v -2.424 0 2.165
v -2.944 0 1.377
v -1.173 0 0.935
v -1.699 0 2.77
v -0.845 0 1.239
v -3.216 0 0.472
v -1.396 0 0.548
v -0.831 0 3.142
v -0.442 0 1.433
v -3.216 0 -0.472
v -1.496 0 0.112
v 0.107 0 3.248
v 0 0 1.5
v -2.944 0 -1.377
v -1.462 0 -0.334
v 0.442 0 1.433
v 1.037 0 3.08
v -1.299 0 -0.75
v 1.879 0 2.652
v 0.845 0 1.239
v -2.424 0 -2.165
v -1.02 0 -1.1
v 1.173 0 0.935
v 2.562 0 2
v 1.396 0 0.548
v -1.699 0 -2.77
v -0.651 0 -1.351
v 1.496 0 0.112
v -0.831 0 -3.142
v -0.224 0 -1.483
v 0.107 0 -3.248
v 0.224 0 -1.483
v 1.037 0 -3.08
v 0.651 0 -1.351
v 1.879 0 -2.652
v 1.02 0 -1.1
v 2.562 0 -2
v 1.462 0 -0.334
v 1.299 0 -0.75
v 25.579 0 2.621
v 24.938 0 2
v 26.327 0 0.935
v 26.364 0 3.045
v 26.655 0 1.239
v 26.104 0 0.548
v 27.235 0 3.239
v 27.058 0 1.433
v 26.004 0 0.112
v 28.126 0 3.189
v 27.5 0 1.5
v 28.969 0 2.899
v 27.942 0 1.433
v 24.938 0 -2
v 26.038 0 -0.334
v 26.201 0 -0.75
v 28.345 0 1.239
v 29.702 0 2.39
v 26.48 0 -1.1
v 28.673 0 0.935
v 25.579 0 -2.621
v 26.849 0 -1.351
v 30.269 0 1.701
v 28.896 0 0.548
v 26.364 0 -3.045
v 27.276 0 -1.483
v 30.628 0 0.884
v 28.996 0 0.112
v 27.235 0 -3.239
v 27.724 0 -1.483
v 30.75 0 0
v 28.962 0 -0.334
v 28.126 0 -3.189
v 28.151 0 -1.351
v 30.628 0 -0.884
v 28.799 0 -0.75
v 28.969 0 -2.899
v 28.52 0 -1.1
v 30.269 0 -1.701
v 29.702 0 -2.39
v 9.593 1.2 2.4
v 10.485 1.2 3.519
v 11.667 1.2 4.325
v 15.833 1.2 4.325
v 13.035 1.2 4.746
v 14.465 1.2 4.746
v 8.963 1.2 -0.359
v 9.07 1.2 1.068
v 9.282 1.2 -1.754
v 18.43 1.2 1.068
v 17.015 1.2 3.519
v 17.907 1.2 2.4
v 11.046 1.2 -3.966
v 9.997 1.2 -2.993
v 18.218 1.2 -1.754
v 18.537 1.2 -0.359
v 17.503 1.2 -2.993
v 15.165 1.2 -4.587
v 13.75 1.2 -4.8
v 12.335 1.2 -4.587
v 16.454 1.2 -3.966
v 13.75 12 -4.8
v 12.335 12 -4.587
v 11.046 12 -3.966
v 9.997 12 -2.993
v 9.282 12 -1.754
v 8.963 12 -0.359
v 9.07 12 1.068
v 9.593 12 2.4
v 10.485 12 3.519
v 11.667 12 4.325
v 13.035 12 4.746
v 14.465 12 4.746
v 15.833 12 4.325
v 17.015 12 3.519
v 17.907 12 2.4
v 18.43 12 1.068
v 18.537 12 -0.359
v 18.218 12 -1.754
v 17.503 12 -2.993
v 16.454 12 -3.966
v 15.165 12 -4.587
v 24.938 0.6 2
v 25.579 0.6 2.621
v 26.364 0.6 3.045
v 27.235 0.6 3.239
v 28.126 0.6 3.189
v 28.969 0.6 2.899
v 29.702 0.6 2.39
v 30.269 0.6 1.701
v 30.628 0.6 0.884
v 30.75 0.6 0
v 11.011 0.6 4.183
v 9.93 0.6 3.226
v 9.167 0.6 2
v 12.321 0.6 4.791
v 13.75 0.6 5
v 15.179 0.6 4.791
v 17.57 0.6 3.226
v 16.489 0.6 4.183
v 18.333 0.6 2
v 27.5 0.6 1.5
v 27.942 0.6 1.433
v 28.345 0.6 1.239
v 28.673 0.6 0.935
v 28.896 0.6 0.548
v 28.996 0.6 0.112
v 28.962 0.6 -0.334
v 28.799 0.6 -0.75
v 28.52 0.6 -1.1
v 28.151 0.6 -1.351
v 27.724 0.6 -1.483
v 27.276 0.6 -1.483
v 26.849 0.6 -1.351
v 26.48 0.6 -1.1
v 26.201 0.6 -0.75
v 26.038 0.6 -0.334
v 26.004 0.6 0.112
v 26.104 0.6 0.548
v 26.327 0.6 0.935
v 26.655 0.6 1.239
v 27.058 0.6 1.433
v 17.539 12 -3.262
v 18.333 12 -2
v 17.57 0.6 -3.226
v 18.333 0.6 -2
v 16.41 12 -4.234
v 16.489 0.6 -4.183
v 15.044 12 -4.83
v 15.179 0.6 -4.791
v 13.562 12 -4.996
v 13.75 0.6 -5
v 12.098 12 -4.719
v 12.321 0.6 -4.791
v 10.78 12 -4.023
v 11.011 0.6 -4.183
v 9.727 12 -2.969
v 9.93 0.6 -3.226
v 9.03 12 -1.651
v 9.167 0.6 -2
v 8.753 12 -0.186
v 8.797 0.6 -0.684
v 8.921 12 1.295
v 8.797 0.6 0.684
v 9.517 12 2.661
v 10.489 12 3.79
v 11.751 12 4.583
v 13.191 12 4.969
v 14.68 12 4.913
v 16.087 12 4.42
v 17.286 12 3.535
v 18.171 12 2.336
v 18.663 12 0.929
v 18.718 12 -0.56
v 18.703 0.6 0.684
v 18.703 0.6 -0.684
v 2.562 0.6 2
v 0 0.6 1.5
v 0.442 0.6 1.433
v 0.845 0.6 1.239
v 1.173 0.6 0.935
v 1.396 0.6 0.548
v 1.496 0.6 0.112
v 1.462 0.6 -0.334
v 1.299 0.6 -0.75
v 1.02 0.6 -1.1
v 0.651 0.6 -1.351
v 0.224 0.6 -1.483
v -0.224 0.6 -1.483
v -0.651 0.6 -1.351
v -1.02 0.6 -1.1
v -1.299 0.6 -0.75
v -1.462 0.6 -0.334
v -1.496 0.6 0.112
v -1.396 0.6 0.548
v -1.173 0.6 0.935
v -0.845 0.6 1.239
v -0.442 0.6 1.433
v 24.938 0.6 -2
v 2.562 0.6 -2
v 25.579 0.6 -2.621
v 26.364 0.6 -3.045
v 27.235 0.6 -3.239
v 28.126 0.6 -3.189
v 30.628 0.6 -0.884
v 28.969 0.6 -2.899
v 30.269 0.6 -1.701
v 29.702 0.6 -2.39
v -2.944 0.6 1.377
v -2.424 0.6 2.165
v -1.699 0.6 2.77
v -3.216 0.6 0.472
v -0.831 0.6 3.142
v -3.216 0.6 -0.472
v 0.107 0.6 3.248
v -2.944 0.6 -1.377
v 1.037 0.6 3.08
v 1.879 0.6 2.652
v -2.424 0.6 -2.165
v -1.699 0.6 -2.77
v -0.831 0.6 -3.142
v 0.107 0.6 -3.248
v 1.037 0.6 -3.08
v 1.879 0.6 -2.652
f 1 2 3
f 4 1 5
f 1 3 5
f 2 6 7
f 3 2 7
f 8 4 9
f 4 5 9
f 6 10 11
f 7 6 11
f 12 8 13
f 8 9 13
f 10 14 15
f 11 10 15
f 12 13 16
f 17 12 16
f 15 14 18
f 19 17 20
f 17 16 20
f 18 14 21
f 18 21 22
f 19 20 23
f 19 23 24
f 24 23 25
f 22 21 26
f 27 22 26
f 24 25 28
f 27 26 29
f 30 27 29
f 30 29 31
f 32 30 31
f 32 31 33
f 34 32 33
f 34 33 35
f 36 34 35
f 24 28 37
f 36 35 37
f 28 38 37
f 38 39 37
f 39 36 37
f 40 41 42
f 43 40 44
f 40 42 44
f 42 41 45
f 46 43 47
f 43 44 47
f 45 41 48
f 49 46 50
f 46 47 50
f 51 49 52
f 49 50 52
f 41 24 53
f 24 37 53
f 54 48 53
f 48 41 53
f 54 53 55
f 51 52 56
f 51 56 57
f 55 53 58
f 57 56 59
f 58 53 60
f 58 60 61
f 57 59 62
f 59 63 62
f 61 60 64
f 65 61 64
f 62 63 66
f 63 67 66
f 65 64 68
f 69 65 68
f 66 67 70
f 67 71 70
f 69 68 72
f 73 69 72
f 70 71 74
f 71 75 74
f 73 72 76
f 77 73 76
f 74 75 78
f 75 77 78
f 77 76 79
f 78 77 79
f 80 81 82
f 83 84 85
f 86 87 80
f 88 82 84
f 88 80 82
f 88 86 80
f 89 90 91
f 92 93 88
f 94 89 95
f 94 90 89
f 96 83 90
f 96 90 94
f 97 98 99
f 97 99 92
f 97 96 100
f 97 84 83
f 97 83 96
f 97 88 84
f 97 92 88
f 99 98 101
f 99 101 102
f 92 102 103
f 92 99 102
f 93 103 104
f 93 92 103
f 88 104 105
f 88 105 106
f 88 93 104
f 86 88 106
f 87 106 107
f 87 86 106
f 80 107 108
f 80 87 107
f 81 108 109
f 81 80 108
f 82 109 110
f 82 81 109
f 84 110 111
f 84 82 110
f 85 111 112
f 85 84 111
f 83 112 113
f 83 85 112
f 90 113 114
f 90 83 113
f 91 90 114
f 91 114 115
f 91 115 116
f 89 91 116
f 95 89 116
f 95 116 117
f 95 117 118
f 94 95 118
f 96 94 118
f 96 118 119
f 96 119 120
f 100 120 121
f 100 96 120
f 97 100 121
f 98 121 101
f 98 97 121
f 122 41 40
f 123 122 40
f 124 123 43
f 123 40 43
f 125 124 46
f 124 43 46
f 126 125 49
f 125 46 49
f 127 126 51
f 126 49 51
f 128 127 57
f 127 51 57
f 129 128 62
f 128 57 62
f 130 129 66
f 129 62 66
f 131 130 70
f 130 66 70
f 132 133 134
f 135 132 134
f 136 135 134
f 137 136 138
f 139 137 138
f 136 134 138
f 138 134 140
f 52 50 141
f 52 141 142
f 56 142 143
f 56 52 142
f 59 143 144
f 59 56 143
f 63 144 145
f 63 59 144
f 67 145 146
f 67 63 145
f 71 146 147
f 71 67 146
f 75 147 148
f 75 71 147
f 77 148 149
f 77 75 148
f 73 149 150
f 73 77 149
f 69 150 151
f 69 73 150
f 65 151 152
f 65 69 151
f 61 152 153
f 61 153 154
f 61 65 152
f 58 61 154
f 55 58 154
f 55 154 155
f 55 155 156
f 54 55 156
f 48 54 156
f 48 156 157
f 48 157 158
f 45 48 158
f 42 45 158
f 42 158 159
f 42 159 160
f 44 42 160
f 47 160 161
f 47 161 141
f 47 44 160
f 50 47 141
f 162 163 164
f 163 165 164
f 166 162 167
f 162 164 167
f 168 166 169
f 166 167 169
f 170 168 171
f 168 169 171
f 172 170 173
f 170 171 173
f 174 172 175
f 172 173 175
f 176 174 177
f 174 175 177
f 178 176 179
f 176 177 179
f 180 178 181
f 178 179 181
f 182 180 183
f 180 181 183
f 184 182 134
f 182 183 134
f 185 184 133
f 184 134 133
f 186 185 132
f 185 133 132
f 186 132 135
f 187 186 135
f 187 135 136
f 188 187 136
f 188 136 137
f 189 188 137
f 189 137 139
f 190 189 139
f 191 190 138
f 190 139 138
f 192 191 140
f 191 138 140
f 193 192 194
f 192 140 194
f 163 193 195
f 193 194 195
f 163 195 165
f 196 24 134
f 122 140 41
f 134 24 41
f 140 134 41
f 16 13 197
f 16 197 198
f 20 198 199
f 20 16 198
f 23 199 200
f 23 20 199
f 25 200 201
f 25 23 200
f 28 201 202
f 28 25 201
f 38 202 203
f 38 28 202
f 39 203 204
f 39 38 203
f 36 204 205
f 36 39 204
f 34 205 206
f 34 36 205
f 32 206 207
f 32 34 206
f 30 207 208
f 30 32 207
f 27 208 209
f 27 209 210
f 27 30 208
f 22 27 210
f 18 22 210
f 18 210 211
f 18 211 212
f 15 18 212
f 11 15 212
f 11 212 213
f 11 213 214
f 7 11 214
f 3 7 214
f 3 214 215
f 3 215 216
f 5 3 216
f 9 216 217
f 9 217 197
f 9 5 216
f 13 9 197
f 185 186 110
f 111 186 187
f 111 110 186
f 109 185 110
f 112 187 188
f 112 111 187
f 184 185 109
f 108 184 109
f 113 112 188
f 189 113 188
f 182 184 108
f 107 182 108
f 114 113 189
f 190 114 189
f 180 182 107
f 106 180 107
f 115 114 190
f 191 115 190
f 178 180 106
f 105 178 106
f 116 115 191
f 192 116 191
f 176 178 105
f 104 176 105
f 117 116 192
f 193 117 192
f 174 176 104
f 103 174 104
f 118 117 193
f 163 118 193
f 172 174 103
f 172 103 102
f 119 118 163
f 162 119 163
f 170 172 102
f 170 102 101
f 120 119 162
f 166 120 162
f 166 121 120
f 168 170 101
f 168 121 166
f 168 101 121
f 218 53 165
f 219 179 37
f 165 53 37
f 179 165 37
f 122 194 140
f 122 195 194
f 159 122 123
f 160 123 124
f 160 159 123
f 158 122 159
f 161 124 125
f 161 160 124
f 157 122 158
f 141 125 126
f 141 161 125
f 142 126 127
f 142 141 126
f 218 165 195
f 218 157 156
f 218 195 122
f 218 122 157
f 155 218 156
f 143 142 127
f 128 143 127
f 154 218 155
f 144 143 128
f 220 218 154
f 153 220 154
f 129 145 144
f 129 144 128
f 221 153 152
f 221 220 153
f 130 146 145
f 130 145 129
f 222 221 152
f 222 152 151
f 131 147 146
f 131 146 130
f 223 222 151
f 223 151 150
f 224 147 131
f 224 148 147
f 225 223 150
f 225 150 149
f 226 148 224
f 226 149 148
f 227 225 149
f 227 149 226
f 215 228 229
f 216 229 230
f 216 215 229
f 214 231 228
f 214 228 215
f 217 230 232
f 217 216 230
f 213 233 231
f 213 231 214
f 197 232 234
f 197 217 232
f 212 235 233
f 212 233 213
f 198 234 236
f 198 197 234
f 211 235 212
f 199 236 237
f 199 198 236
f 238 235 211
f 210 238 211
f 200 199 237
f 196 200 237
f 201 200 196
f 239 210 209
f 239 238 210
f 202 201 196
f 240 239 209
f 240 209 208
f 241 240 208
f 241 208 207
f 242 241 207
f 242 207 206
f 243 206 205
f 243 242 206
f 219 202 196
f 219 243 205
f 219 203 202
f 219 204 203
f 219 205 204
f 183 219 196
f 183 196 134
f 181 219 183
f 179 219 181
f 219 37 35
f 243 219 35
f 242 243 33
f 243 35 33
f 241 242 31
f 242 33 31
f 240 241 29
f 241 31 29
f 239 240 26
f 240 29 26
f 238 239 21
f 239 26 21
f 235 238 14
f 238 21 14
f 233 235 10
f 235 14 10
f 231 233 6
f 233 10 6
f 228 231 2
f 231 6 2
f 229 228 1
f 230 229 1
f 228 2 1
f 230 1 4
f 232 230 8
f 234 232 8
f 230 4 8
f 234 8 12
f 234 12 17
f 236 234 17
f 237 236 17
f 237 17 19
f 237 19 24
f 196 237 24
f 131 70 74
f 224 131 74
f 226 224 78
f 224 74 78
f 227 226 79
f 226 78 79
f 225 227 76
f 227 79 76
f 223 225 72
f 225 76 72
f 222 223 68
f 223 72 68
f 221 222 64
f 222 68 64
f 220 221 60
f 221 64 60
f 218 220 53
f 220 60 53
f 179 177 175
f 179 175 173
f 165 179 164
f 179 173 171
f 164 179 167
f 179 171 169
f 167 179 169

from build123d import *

# Parameters (mm, degrees)
SCHIZZO1_R                   = 1.5
ESTRUSIONE_ESTRUSIONE1_DEPTH = 0.6
SCHIZZO2_R                   = 5
ESTRUSIONE_ESTRUSIONE2_DEPTH = 0.6
SCHIZZO3_R                   = 5
SCHIZZO3_R_2                 = 4.8
ESTRUSIONE_ESTRUSIONE3_DEPTH = 10.8


with BuildPart() as part:
    # Schizzo1 → Estrusione-Estrusione1 (new body)
    # profile 1 of 5: a face of its own
    with BuildSketch(Plane(origin=(0, 0, 0), x_dir=(1, 0, 0), z_dir=(0, 1, 0))):
        with BuildLine():
            ThreePointArc((2.561737691, 2), (-3.25, 0), (2.561737691, -2))
            Line((2.561737691, -2), (2.561737691, 2))
        make_face()
        with Locations(Location((0, 0, 0), (0, 0, 270))):
            Circle(SCHIZZO1_R, mode=Mode.SUBTRACT)
    # profile 2 of 5: a face of its own
    with BuildSketch(Plane(origin=(0, 0, 0), x_dir=(1, 0, 0), z_dir=(0, 1, 0))):
        with BuildLine():
            ThreePointArc((3.25, 0), (3.073121174, -1.057556737), (2.561737691, -2))
            Line((2.561737691, -2), (24.938262309, -2))
            ThreePointArc((24.938262309, -2), (24.25, 0), (24.938262309, 2))
            Line((24.938262309, 2), (2.561737691, 2))
            ThreePointArc((2.561737691, 2), (3.073121174, 1.057556737), (3.25, 0))
        make_face()
    # profile 3 of 5: a face of its own
    with BuildSketch(Plane(origin=(0, 0, 0), x_dir=(1, 0, 0), z_dir=(0, 1, 0))):
        with BuildLine():
            Line((2.561737691, 2), (2.561737691, -2))
            ThreePointArc((2.561737691, -2), (3.073121174, -1.057556737), (3.25, 0))
            ThreePointArc((3.25, 0), (3.073121174, 1.057556737), (2.561737691, 2))
        make_face()
    # profile 4 of 5: a face of its own
    with BuildSketch(Plane(origin=(0, 0, 0), x_dir=(1, 0, 0), z_dir=(0, 1, 0))):
        with BuildLine():
            Line((24.938262309, 2), (24.938262309, -2))
            ThreePointArc((24.938262309, -2), (28.557556737, -3.073121174), (30.75, 0))
            ThreePointArc((30.75, 0), (28.557556737, 3.073121174), (24.938262309, 2))
        make_face()
        with Locations(Location((27.5, 0, 0), (0, 0, 270))):
            Circle(SCHIZZO1_R, mode=Mode.SUBTRACT)
    # profile 5 of 5: a face of its own
    with BuildSketch(Plane(origin=(0, 0, 0), x_dir=(1, 0, 0), z_dir=(0, 1, 0))):
        with BuildLine():
            ThreePointArc((24.938262309, 2), (24.25, 0), (24.938262309, -2))
            Line((24.938262309, -2), (24.938262309, 2))
        make_face()
    extrude(amount=ESTRUSIONE_ESTRUSIONE1_DEPTH)

    # Schizzo2 → Estrusione-Estrusione2 (add)
    with BuildSketch(Plane(origin=(0, 0.6, 0), x_dir=(1, 0, 0), z_dir=(0, 1, 0))):
        with Locations(Location((13.75, 0, 0), (0, 0, 23.578178478))):
            Circle(SCHIZZO2_R)
    extrude(amount=ESTRUSIONE_ESTRUSIONE2_DEPTH)

    # Schizzo3 → Estrusione-Estrusione3 (add)
    with BuildSketch(Plane(origin=(0, 1.2, 0), x_dir=(1, 0, 0), z_dir=(0, 1, 0))):
        with Locations(Location((13.75, 0, 0), (0, 0, 23.578178478))):
            Circle(SCHIZZO3_R)
        with Locations(Location((13.75, 0, 0), (0, 0, 90))):
            Circle(SCHIZZO3_R_2, mode=Mode.SUBTRACT)
    extrude(amount=ESTRUSIONE_ESTRUSIONE3_DEPTH)


solid = part.part
